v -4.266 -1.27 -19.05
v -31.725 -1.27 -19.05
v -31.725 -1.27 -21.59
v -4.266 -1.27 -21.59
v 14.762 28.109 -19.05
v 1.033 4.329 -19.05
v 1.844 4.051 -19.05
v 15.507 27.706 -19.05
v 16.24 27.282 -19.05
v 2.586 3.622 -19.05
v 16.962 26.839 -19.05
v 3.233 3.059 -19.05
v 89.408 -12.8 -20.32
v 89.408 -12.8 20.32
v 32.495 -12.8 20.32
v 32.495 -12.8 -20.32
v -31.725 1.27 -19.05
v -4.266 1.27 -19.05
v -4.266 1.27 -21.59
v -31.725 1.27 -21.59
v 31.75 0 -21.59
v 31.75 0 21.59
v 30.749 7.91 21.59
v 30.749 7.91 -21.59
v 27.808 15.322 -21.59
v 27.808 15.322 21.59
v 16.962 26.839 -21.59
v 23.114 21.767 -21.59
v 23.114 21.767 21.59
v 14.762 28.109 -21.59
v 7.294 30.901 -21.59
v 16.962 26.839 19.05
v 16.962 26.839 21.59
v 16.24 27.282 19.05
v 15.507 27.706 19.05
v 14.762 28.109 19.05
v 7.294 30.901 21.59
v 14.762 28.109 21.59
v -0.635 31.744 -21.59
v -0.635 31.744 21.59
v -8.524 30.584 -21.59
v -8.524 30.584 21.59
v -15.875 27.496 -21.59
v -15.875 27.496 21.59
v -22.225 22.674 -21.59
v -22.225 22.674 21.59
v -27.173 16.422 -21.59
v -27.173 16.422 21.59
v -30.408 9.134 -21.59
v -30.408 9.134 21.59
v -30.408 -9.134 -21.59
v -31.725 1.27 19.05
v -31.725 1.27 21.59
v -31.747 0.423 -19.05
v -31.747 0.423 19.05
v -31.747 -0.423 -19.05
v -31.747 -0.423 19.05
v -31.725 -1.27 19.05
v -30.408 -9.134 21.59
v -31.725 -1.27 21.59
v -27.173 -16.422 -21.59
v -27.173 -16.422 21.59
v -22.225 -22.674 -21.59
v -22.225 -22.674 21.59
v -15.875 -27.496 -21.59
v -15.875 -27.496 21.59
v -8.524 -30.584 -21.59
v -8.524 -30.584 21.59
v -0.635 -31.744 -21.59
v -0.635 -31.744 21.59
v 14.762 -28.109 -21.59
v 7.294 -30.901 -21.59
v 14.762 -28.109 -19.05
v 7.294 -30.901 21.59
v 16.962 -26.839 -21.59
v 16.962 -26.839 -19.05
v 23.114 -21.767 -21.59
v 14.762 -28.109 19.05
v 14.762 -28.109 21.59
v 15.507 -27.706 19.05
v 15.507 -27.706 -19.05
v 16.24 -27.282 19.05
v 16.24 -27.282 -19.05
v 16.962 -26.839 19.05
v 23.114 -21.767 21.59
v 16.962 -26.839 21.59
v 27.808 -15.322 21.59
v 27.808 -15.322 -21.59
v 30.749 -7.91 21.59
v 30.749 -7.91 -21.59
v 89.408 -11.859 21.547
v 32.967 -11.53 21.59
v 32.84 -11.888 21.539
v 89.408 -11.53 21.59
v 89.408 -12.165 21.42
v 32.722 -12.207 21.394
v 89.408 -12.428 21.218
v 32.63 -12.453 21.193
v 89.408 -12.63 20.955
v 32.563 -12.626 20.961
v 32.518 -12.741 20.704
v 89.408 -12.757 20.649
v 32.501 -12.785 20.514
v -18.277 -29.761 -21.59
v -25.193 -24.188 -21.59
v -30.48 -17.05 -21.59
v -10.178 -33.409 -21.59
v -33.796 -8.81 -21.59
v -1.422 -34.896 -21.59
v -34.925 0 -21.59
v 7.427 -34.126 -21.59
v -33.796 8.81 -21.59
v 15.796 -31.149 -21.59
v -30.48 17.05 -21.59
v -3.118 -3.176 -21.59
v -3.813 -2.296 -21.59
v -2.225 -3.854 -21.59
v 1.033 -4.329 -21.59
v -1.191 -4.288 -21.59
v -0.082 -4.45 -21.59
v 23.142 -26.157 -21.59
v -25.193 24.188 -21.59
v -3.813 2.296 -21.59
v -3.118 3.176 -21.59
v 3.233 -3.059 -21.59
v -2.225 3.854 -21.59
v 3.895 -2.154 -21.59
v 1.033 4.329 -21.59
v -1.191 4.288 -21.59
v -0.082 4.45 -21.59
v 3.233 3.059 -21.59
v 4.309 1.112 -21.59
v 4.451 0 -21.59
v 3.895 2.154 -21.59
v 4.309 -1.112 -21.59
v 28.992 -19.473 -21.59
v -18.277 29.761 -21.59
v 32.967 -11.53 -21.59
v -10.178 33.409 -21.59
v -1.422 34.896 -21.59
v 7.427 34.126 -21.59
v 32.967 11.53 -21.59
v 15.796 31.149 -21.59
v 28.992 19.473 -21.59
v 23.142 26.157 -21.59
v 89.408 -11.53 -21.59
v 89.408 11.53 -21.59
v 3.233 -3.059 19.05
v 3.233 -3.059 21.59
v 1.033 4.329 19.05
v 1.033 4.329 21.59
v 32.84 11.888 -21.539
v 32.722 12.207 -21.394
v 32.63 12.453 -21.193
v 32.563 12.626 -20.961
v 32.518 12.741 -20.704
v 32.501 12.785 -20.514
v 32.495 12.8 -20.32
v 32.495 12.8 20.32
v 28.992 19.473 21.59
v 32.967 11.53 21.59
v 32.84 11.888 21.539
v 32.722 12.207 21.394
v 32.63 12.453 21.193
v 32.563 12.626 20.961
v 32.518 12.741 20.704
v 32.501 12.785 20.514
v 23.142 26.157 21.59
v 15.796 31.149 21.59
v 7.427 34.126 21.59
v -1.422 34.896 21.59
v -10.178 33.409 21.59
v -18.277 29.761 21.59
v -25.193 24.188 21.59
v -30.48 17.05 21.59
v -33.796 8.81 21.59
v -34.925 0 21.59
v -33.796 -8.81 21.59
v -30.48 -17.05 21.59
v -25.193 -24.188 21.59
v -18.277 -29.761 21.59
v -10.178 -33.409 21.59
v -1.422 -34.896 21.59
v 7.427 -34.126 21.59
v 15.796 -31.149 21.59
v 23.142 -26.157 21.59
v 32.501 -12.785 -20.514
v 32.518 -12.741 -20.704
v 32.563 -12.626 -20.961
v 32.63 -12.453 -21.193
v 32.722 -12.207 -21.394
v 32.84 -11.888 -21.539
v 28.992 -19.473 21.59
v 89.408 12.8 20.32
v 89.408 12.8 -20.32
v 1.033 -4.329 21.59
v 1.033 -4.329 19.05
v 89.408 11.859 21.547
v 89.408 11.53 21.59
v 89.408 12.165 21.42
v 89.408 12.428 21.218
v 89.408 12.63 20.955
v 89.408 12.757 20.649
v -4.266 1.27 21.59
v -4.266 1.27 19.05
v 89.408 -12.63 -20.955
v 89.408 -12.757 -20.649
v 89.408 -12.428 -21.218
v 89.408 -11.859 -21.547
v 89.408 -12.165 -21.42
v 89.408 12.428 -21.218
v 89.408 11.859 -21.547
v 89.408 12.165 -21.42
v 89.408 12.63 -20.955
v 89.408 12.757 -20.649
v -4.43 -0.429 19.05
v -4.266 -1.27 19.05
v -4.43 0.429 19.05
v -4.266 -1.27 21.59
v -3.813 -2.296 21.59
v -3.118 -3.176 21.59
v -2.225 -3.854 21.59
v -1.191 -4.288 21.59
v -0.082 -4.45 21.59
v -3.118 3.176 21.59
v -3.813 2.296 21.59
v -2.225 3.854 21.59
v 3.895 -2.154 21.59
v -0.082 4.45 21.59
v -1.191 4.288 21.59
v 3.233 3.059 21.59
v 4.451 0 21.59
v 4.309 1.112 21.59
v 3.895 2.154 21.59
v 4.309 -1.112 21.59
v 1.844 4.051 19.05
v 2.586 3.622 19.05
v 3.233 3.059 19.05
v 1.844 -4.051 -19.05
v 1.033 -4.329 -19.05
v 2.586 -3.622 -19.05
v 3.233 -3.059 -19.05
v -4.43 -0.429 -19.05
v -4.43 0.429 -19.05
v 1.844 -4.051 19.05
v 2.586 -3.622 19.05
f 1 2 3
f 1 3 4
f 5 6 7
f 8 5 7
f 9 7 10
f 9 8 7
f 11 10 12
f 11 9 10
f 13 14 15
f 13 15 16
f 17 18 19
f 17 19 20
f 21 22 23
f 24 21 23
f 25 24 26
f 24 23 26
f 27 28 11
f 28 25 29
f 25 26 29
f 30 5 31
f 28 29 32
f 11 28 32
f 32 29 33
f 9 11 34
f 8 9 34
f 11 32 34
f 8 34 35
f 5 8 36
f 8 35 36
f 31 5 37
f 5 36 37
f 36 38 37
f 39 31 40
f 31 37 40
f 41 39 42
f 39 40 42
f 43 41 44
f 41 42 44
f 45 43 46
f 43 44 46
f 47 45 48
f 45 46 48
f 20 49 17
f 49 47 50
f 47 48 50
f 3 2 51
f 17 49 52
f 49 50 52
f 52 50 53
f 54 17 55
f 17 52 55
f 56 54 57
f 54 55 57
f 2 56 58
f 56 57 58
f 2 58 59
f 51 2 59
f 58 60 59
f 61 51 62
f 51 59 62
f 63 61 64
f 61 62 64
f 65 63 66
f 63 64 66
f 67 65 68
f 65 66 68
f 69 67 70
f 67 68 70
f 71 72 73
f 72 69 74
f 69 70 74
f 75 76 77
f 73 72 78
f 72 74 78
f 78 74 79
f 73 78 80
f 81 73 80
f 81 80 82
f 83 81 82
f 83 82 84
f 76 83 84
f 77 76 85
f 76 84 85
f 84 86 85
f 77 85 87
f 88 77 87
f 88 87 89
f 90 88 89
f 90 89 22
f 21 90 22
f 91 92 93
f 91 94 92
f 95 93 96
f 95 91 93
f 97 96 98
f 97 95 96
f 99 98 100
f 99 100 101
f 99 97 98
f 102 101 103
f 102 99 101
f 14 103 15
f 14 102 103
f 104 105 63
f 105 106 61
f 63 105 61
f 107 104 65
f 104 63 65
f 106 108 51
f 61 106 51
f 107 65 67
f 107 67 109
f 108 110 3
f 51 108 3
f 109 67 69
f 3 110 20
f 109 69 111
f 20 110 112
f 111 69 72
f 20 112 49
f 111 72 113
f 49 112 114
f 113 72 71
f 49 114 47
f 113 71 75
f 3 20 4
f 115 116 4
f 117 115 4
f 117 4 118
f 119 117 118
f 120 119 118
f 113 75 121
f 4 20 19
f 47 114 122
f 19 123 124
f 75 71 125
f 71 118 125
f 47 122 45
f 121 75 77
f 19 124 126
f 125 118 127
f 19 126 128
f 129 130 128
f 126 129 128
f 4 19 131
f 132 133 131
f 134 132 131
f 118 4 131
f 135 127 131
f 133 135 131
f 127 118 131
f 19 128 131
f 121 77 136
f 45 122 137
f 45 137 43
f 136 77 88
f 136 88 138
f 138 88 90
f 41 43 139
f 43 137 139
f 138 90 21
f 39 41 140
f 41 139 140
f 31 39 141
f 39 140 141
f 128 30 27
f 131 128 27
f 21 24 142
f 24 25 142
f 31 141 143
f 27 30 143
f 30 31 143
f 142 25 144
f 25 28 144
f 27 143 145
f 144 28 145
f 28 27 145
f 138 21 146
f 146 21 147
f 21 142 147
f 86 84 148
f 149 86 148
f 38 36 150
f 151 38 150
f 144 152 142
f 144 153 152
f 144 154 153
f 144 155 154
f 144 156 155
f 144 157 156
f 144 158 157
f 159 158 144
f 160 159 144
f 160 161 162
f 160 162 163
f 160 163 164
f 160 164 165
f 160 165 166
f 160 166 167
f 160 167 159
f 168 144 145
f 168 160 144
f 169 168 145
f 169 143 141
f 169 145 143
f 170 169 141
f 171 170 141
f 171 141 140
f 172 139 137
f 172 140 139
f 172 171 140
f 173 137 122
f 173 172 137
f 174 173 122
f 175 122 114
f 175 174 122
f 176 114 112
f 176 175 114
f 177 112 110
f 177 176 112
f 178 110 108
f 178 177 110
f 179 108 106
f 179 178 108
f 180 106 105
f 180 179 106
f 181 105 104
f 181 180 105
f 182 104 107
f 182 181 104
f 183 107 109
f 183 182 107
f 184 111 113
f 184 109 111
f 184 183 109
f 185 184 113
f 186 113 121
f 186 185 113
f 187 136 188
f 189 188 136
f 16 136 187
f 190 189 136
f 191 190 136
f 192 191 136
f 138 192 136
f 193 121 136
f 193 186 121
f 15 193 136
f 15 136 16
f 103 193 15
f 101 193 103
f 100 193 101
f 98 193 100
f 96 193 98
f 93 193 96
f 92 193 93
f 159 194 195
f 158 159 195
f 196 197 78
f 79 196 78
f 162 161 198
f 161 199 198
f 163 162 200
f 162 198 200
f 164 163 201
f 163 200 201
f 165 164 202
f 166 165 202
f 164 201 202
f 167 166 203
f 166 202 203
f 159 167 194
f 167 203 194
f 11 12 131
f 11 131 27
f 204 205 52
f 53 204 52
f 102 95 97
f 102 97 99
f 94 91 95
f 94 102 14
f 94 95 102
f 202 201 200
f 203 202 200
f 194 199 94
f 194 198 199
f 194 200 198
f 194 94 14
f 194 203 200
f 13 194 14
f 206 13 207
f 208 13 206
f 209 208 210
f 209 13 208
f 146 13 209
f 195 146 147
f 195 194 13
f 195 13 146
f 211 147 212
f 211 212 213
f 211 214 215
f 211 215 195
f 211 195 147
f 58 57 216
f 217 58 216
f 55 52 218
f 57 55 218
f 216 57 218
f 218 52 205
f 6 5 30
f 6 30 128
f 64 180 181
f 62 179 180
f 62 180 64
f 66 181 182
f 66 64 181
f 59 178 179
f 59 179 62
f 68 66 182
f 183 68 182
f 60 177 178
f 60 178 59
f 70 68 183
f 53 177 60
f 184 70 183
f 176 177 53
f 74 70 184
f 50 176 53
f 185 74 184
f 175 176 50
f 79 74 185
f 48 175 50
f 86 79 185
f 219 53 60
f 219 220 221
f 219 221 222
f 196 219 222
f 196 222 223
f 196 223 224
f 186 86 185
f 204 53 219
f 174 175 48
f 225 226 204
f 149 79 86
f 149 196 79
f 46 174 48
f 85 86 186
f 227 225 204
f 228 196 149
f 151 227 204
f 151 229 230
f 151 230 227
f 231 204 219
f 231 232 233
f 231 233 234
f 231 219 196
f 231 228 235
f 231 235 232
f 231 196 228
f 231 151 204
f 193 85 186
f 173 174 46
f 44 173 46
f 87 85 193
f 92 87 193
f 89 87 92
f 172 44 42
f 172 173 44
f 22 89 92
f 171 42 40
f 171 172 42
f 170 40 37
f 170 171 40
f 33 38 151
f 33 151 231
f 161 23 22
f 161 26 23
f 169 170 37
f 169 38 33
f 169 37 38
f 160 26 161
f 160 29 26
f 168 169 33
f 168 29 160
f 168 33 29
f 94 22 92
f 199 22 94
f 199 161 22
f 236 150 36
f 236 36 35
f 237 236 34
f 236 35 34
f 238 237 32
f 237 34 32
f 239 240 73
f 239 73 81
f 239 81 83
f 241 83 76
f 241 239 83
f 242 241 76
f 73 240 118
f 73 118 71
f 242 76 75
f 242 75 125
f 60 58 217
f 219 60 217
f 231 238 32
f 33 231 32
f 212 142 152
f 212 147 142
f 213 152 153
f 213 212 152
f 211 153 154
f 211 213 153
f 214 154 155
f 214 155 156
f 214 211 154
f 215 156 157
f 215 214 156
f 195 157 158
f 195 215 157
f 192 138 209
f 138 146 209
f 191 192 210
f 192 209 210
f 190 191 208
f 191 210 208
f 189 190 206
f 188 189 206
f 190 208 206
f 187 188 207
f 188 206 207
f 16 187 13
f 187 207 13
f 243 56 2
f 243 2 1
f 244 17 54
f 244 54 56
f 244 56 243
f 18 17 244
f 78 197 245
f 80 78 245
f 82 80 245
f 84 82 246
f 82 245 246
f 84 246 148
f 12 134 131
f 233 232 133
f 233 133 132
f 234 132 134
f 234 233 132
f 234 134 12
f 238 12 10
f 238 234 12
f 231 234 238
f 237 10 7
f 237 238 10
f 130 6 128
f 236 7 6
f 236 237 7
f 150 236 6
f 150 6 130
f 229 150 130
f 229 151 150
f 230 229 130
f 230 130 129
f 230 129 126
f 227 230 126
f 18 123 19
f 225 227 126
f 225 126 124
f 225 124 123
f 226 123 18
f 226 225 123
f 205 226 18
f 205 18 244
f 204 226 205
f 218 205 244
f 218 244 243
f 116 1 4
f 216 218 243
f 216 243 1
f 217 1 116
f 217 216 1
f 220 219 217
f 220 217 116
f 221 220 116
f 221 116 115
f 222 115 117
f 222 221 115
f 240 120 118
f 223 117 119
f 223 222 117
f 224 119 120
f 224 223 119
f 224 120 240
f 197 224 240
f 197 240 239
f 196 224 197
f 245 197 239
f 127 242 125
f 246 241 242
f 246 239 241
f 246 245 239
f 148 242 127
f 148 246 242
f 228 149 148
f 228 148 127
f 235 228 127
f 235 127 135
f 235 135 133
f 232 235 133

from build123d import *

# Parameters (mm, degrees)
SKETCH1_R           = 34.925
BOSS_EXTRUDE1_DEPTH = 21.59
SKETCH2_W           = 43.18
SKETCH2_H           = 25.6
BOSS_EXTRUDE2_DEPTH = 89.408
SKETCH3_R           = 31.75
CUT_EXTRUDE1_DEPTH  = 106.252356216
SKETCH4_R           = 4.450657561
BOSS_EXTRUDE3_DEPTH = 43.18
EXTRUDE_THIN1_START = -2.54
EXTRUDE_THIN1_DEPTH = 2.54
FILLET1_R           = 1.27


# Read off the part's stored shape, not the designer's step: Extrude-Thin1
with BuildPart() as part:
    # Sketch1 → Boss-Extrude1 (new, symmetric)
    with BuildSketch(Plane.XY):
        Circle(SKETCH1_R)
    extrude(amount=BOSS_EXTRUDE1_DEPTH, both=True)

    # Sketch2 → Boss-Extrude2 (add)
    with BuildSketch(Plane(origin=(0, 0, 0), x_dir=(0, 0, -1), z_dir=(1, 0, 0))):
        Rectangle(SKETCH2_W, SKETCH2_H)
    extrude(amount=BOSS_EXTRUDE2_DEPTH)

    # Sketch3 → Cut-Extrude1 (cut, through all)
    with BuildSketch(Plane.XY.offset(21.59)):
        Circle(SKETCH3_R)
    extrude(amount=-CUT_EXTRUDE1_DEPTH, mode=Mode.SUBTRACT)



with BuildPart() as body_2:
    # Sketch4 → Boss-Extrude3 (new body)
    with BuildSketch(Plane.XY.offset(21.59)):
        Circle(SKETCH4_R)
    extrude(amount=-BOSS_EXTRUDE3_DEPTH)


with BuildPart() as part_1:
    add(part.part)

    add(body_2.part)  # Extrude-Thin1 merges body 2
    # Extrude-Thin1 outline → Extrude-Thin1 (add)
    with BuildSketch(Plane.XY.offset(21.59).offset(EXTRUDE_THIN1_START)):
        with BuildLine():
            ThreePointArc((-31.724589832, 1.27), (-31.75, 0), (-31.724589832, -1.27))
            Line((-31.724589832, -1.27), (-4.265612819, -1.27))
            ThreePointArc((-4.265612819, -1.27), (-4.450657561, 0), (-4.265612819, 1.27))
            Line((-4.265612819, 1.27), (-31.724589832, 1.27))
        make_face()
        with BuildLine():
            Line((1.032954147, -4.329129064), (14.762442653, -28.109300719))
            ThreePointArc((14.762442653, -28.109300719), (15.875, -27.49630657), (16.962147179, -26.839300719))
            Line((16.962147179, -26.839300719), (3.232658672, -3.059129064))
            ThreePointArc((3.232658672, -3.059129064), (2.225328781, -3.854382511), (1.032954147, -4.329129064))
        make_face()
        with BuildLine():
            ThreePointArc((16.962147179, 26.839300719), (15.875, 27.49630657), (14.762442653, 28.109300719))
            Line((14.762442653, 28.109300719), (1.032954147, 4.329129064))
            ThreePointArc((1.032954147, 4.329129064), (2.225328781, 3.854382511), (3.232658672, 3.059129064))
            Line((3.232658672, 3.059129064), (16.962147179, 26.839300719))
        make_face()
    extrude_thin1 = extrude(amount=EXTRUDE_THIN1_DEPTH)

    # Mirror1: Extrude-Thin1 across plane
    add(extrude_thin1.mirror(Plane.XY))

    # Fillet1
    fillet1_edges = [part_1.edges().sort_by_distance(p)[0] for p in [
        (60.951427681, 12.8, -21.59),
        (60.951427681, -12.8, 21.59),
        (60.951427681, -12.8, -21.59),
        (60.951427681, 12.8, 21.59),
    ]]
    fillet(fillet1_edges, radius=FILLET1_R)


solid = part_1.part
